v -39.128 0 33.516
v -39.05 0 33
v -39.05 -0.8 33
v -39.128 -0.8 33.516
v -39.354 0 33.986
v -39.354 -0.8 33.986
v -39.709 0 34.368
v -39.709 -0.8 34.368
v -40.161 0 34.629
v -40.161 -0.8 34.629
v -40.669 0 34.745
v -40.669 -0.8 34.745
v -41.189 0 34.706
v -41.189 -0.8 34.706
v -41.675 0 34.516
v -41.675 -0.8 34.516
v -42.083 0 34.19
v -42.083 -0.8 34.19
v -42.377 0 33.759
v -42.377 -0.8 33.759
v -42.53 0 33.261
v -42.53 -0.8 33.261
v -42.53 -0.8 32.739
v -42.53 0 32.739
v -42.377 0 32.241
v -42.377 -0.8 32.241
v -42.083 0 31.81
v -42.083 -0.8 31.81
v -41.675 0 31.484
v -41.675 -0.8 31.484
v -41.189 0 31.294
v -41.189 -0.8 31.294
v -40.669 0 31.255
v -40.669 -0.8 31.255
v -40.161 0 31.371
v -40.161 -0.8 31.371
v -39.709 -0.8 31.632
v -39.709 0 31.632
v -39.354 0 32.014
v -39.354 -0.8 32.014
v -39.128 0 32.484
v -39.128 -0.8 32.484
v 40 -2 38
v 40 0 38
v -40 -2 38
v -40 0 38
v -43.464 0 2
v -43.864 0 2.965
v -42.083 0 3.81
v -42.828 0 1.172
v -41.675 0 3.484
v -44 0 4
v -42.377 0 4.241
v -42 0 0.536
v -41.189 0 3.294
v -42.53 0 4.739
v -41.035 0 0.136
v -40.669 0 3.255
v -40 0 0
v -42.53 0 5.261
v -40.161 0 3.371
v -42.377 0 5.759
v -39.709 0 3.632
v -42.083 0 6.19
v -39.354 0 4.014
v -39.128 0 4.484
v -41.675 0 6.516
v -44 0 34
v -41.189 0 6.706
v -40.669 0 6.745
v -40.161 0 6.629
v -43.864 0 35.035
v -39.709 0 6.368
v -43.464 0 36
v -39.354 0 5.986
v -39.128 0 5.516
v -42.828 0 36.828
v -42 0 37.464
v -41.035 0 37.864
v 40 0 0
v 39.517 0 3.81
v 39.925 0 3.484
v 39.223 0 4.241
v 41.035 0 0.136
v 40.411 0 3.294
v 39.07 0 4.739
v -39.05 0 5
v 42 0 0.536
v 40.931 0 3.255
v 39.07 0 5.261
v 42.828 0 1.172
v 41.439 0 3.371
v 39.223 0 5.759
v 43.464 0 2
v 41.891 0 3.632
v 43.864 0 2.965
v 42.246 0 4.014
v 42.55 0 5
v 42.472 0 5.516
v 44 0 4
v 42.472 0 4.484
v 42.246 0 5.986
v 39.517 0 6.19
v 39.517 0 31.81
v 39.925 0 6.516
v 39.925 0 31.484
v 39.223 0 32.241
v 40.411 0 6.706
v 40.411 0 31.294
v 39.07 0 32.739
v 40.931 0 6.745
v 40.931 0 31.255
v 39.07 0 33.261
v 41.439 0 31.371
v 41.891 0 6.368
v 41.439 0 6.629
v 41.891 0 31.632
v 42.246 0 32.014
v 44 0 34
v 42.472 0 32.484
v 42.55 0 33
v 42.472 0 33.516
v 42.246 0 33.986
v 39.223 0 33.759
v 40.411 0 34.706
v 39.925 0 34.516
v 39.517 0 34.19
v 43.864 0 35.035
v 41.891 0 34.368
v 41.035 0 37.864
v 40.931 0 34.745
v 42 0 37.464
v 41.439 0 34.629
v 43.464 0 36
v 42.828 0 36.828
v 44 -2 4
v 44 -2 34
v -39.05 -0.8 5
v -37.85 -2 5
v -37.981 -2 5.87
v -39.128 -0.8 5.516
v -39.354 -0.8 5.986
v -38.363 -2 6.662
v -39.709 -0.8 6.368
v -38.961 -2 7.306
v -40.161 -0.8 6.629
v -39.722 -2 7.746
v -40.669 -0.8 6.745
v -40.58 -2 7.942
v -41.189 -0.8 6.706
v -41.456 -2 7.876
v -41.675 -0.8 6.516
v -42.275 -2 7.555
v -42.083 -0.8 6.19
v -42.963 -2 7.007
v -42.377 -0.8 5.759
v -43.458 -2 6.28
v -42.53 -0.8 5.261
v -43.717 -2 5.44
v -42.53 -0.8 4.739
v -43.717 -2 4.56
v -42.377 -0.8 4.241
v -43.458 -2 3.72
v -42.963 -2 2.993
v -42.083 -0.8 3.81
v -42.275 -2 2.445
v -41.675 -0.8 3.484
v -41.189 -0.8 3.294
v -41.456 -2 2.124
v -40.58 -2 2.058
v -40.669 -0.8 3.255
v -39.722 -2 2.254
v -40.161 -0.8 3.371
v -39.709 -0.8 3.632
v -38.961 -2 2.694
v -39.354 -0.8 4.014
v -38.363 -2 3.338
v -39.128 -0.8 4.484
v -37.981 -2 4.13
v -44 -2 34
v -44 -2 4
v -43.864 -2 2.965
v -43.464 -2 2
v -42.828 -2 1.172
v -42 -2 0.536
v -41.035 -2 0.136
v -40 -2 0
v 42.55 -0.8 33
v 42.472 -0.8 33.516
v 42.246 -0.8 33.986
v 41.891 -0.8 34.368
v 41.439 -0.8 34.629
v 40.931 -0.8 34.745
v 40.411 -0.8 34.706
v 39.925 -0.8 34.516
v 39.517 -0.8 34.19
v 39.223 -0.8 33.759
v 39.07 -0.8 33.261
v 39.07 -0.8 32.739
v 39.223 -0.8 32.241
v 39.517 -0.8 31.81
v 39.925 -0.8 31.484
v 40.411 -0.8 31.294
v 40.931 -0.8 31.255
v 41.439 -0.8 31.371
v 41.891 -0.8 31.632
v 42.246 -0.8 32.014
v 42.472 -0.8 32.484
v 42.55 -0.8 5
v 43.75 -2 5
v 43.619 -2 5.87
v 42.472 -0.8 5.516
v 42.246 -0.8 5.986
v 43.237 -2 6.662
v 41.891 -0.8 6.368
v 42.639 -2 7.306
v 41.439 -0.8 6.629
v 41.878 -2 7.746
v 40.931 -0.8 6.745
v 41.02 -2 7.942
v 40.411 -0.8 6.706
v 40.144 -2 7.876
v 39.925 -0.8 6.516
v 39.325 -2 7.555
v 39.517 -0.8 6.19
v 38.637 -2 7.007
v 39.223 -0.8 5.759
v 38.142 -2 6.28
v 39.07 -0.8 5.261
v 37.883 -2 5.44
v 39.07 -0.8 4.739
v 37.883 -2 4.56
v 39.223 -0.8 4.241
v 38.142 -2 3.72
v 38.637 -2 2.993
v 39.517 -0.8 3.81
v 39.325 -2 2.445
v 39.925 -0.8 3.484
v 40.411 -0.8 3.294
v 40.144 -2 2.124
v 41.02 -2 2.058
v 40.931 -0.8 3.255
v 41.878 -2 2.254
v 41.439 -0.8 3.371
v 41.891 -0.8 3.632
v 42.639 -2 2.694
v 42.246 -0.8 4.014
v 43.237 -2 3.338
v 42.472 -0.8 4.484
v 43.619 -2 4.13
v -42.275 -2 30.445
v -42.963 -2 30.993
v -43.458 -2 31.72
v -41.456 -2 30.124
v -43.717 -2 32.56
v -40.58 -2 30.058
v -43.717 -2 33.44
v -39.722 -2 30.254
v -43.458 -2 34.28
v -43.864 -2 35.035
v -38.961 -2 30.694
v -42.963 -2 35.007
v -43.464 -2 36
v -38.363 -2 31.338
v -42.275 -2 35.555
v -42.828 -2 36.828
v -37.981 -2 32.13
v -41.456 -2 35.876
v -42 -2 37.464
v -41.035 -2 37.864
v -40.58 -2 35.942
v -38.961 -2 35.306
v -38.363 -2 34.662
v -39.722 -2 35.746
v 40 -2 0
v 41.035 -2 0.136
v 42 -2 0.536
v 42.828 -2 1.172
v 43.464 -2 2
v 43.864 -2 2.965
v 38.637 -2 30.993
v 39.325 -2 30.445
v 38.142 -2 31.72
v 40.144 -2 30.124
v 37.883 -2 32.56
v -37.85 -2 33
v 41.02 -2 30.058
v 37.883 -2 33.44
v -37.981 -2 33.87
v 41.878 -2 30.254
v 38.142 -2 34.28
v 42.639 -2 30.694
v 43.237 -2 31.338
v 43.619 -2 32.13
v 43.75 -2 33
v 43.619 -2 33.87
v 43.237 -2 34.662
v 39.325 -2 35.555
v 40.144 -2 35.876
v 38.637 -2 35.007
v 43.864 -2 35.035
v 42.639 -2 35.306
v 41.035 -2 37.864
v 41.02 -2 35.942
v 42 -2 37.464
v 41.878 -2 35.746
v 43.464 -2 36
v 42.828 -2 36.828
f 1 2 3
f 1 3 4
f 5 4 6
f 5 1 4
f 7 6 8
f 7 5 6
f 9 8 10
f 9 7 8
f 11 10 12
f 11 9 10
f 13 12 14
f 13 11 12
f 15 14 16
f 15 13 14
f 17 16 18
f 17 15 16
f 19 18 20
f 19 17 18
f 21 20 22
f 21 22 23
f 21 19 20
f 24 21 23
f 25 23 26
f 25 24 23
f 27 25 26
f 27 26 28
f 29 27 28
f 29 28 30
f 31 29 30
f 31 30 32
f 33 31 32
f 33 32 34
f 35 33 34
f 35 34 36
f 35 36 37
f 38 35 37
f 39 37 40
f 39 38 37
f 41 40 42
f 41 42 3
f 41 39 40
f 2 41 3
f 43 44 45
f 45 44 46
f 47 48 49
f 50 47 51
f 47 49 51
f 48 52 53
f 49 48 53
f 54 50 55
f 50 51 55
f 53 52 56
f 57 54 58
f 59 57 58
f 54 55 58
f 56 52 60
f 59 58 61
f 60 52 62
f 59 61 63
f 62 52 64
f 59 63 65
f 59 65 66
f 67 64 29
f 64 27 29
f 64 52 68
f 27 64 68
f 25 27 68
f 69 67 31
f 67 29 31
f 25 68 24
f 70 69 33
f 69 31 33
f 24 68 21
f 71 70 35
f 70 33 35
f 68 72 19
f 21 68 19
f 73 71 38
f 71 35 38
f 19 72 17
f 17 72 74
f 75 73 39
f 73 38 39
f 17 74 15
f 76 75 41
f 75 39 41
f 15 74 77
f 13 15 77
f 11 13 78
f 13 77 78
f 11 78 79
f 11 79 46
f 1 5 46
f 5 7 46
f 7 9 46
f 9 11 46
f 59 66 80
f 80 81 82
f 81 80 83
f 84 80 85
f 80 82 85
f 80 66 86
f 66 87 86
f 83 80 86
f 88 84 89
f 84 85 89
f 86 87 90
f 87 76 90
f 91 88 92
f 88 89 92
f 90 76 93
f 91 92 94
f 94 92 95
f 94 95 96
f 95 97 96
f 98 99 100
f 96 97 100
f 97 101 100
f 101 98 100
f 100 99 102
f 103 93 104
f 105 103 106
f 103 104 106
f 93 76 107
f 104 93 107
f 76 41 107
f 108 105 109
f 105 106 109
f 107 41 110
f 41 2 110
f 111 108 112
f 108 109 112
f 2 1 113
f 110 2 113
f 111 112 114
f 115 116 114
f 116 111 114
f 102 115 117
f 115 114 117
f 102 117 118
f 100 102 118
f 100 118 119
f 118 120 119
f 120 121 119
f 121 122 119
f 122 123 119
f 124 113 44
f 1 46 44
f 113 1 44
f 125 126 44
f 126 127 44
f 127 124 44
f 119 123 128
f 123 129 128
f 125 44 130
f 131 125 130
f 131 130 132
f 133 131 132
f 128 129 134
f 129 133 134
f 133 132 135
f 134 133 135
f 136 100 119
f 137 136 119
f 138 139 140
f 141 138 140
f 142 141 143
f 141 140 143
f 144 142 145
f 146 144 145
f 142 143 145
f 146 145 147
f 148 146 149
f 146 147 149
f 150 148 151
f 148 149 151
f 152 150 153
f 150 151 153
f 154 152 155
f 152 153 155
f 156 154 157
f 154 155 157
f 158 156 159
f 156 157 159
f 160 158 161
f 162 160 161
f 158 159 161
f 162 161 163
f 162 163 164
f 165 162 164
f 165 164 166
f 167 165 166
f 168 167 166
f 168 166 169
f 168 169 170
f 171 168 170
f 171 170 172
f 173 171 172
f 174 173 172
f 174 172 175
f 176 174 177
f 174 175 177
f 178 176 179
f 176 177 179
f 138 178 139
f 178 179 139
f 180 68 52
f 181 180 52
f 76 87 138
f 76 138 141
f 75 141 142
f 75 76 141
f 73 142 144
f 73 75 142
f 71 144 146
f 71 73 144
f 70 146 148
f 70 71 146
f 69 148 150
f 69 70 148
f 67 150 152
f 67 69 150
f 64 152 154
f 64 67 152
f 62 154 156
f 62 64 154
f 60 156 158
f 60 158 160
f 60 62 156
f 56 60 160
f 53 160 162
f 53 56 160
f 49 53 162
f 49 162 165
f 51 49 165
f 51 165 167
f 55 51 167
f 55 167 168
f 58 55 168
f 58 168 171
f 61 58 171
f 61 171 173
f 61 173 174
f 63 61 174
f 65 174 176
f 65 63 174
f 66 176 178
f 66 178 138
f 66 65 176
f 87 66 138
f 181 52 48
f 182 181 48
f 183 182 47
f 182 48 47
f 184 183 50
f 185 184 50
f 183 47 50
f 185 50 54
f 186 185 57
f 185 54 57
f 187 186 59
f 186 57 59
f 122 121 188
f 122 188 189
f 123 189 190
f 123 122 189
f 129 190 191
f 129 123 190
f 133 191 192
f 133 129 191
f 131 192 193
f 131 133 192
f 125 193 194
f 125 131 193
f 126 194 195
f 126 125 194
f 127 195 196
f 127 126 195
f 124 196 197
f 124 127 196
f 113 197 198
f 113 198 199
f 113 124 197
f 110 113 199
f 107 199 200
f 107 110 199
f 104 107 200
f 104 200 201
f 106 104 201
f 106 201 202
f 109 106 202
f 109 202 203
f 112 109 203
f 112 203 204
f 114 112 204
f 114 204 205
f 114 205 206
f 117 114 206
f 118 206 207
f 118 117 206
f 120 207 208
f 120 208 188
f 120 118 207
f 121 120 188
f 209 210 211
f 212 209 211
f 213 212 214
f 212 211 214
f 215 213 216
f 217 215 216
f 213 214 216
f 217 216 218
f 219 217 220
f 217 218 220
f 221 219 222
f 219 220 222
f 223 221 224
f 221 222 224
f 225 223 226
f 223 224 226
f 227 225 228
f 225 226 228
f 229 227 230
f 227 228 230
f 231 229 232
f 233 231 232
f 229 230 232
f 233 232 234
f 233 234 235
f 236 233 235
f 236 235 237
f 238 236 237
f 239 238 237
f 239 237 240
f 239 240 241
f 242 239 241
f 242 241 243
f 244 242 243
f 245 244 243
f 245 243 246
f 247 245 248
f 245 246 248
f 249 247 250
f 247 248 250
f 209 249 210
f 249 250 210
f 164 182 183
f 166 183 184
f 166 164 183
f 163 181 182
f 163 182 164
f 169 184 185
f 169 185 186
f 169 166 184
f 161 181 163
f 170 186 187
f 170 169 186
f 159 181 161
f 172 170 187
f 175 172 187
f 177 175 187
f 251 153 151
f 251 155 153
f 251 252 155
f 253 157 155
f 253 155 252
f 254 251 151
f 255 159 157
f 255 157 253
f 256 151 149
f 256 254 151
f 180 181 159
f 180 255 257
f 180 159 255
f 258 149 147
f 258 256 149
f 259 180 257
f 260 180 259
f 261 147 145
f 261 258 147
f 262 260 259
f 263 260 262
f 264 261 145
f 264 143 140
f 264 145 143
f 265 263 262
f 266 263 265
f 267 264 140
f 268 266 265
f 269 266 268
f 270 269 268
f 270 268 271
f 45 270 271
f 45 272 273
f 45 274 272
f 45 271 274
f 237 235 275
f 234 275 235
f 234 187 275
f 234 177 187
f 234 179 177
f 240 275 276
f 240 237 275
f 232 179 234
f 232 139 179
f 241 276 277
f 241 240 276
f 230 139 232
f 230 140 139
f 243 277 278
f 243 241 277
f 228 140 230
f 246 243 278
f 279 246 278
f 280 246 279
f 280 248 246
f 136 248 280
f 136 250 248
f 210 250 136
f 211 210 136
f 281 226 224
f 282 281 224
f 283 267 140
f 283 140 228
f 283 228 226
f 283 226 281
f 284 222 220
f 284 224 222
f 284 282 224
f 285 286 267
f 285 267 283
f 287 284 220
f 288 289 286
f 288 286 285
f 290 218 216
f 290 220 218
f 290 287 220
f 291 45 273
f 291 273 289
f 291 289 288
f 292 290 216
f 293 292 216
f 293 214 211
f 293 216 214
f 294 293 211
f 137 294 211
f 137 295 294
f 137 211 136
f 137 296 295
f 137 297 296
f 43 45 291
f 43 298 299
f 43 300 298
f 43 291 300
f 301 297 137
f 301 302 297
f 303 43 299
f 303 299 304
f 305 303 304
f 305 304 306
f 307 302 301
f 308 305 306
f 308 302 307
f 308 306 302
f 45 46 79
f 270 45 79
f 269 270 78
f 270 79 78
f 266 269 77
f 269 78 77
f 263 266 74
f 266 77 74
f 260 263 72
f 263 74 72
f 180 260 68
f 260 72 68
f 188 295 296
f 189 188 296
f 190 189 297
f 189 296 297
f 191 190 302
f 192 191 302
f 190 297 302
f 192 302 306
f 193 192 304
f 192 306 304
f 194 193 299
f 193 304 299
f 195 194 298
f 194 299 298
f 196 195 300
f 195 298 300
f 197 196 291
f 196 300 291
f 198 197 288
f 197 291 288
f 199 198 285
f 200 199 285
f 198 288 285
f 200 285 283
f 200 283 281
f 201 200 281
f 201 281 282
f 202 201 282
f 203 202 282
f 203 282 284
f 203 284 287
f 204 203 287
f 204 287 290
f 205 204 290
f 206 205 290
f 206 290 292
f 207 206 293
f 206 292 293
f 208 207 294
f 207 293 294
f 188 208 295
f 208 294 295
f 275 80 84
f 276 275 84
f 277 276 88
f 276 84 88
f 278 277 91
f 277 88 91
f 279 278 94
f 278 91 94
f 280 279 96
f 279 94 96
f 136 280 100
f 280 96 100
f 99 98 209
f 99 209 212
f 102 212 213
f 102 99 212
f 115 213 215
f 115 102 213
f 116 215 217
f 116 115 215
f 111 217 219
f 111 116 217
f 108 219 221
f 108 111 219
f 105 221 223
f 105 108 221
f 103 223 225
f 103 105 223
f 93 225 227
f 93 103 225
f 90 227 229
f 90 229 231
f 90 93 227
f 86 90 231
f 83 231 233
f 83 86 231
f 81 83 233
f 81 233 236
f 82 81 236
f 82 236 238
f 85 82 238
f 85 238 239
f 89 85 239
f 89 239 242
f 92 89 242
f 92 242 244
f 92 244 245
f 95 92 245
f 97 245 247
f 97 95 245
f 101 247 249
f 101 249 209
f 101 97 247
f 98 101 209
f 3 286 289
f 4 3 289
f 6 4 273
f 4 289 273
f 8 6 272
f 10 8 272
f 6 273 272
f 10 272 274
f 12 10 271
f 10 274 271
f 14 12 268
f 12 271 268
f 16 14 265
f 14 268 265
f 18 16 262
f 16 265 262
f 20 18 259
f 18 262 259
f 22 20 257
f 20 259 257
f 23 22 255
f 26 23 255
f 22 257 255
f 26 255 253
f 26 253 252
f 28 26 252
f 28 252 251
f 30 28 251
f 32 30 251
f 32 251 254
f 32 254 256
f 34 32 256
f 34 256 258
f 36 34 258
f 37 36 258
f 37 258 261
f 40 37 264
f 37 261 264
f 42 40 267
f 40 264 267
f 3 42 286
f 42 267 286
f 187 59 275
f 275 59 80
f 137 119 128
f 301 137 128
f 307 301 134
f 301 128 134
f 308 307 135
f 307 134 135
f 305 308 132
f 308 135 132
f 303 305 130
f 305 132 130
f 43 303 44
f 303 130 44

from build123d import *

# Parameters (mm, degrees)
F0_R     = 1.75
F1_DEPTH = 2
F2_SIZE  = 1.2


with BuildPart() as f1:
    # F0 (on Front) → F1 (new body)
    with BuildSketch(Plane.XZ):
        with BuildLine():
            Line((40, 38), (-40, 38))
            ThreePointArc((-40, 38), (-42.828427, 36.828427), (-44, 34))
            Line((-44, 34), (-44, 4))
            ThreePointArc((-44, 4), (-42.828427, 1.171573), (-40, 0))
            Line((-40, 0), (40, 0))
            ThreePointArc((40, 0), (42.828427, 1.171573), (44, 4))
            Line((44, 4), (44, 34))
            ThreePointArc((44, 34), (42.828427, 36.828427), (40, 38))
        make_face()
        with Locations((-40.8, 5)):
            Circle(F0_R, mode=Mode.SUBTRACT)
        with Locations((40.8, 5)):
            Circle(F0_R, mode=Mode.SUBTRACT)
        with Locations((-40.8, 33)):
            Circle(F0_R, mode=Mode.SUBTRACT)
        with Locations((40.8, 33)):
            Circle(F0_R, mode=Mode.SUBTRACT)
    extrude(amount=F1_DEPTH)

    # F2
    f2_edges = [f1.edges().sort_by_distance(p)[0] for p in [
        (-42.55, -2, 33),
        (-42.55, -2, 5),
        (39.05, -2, 5),
        (39.05, -2, 33),
    ]]
    chamfer(f2_edges, length=F2_SIZE)


solid = f1.part
